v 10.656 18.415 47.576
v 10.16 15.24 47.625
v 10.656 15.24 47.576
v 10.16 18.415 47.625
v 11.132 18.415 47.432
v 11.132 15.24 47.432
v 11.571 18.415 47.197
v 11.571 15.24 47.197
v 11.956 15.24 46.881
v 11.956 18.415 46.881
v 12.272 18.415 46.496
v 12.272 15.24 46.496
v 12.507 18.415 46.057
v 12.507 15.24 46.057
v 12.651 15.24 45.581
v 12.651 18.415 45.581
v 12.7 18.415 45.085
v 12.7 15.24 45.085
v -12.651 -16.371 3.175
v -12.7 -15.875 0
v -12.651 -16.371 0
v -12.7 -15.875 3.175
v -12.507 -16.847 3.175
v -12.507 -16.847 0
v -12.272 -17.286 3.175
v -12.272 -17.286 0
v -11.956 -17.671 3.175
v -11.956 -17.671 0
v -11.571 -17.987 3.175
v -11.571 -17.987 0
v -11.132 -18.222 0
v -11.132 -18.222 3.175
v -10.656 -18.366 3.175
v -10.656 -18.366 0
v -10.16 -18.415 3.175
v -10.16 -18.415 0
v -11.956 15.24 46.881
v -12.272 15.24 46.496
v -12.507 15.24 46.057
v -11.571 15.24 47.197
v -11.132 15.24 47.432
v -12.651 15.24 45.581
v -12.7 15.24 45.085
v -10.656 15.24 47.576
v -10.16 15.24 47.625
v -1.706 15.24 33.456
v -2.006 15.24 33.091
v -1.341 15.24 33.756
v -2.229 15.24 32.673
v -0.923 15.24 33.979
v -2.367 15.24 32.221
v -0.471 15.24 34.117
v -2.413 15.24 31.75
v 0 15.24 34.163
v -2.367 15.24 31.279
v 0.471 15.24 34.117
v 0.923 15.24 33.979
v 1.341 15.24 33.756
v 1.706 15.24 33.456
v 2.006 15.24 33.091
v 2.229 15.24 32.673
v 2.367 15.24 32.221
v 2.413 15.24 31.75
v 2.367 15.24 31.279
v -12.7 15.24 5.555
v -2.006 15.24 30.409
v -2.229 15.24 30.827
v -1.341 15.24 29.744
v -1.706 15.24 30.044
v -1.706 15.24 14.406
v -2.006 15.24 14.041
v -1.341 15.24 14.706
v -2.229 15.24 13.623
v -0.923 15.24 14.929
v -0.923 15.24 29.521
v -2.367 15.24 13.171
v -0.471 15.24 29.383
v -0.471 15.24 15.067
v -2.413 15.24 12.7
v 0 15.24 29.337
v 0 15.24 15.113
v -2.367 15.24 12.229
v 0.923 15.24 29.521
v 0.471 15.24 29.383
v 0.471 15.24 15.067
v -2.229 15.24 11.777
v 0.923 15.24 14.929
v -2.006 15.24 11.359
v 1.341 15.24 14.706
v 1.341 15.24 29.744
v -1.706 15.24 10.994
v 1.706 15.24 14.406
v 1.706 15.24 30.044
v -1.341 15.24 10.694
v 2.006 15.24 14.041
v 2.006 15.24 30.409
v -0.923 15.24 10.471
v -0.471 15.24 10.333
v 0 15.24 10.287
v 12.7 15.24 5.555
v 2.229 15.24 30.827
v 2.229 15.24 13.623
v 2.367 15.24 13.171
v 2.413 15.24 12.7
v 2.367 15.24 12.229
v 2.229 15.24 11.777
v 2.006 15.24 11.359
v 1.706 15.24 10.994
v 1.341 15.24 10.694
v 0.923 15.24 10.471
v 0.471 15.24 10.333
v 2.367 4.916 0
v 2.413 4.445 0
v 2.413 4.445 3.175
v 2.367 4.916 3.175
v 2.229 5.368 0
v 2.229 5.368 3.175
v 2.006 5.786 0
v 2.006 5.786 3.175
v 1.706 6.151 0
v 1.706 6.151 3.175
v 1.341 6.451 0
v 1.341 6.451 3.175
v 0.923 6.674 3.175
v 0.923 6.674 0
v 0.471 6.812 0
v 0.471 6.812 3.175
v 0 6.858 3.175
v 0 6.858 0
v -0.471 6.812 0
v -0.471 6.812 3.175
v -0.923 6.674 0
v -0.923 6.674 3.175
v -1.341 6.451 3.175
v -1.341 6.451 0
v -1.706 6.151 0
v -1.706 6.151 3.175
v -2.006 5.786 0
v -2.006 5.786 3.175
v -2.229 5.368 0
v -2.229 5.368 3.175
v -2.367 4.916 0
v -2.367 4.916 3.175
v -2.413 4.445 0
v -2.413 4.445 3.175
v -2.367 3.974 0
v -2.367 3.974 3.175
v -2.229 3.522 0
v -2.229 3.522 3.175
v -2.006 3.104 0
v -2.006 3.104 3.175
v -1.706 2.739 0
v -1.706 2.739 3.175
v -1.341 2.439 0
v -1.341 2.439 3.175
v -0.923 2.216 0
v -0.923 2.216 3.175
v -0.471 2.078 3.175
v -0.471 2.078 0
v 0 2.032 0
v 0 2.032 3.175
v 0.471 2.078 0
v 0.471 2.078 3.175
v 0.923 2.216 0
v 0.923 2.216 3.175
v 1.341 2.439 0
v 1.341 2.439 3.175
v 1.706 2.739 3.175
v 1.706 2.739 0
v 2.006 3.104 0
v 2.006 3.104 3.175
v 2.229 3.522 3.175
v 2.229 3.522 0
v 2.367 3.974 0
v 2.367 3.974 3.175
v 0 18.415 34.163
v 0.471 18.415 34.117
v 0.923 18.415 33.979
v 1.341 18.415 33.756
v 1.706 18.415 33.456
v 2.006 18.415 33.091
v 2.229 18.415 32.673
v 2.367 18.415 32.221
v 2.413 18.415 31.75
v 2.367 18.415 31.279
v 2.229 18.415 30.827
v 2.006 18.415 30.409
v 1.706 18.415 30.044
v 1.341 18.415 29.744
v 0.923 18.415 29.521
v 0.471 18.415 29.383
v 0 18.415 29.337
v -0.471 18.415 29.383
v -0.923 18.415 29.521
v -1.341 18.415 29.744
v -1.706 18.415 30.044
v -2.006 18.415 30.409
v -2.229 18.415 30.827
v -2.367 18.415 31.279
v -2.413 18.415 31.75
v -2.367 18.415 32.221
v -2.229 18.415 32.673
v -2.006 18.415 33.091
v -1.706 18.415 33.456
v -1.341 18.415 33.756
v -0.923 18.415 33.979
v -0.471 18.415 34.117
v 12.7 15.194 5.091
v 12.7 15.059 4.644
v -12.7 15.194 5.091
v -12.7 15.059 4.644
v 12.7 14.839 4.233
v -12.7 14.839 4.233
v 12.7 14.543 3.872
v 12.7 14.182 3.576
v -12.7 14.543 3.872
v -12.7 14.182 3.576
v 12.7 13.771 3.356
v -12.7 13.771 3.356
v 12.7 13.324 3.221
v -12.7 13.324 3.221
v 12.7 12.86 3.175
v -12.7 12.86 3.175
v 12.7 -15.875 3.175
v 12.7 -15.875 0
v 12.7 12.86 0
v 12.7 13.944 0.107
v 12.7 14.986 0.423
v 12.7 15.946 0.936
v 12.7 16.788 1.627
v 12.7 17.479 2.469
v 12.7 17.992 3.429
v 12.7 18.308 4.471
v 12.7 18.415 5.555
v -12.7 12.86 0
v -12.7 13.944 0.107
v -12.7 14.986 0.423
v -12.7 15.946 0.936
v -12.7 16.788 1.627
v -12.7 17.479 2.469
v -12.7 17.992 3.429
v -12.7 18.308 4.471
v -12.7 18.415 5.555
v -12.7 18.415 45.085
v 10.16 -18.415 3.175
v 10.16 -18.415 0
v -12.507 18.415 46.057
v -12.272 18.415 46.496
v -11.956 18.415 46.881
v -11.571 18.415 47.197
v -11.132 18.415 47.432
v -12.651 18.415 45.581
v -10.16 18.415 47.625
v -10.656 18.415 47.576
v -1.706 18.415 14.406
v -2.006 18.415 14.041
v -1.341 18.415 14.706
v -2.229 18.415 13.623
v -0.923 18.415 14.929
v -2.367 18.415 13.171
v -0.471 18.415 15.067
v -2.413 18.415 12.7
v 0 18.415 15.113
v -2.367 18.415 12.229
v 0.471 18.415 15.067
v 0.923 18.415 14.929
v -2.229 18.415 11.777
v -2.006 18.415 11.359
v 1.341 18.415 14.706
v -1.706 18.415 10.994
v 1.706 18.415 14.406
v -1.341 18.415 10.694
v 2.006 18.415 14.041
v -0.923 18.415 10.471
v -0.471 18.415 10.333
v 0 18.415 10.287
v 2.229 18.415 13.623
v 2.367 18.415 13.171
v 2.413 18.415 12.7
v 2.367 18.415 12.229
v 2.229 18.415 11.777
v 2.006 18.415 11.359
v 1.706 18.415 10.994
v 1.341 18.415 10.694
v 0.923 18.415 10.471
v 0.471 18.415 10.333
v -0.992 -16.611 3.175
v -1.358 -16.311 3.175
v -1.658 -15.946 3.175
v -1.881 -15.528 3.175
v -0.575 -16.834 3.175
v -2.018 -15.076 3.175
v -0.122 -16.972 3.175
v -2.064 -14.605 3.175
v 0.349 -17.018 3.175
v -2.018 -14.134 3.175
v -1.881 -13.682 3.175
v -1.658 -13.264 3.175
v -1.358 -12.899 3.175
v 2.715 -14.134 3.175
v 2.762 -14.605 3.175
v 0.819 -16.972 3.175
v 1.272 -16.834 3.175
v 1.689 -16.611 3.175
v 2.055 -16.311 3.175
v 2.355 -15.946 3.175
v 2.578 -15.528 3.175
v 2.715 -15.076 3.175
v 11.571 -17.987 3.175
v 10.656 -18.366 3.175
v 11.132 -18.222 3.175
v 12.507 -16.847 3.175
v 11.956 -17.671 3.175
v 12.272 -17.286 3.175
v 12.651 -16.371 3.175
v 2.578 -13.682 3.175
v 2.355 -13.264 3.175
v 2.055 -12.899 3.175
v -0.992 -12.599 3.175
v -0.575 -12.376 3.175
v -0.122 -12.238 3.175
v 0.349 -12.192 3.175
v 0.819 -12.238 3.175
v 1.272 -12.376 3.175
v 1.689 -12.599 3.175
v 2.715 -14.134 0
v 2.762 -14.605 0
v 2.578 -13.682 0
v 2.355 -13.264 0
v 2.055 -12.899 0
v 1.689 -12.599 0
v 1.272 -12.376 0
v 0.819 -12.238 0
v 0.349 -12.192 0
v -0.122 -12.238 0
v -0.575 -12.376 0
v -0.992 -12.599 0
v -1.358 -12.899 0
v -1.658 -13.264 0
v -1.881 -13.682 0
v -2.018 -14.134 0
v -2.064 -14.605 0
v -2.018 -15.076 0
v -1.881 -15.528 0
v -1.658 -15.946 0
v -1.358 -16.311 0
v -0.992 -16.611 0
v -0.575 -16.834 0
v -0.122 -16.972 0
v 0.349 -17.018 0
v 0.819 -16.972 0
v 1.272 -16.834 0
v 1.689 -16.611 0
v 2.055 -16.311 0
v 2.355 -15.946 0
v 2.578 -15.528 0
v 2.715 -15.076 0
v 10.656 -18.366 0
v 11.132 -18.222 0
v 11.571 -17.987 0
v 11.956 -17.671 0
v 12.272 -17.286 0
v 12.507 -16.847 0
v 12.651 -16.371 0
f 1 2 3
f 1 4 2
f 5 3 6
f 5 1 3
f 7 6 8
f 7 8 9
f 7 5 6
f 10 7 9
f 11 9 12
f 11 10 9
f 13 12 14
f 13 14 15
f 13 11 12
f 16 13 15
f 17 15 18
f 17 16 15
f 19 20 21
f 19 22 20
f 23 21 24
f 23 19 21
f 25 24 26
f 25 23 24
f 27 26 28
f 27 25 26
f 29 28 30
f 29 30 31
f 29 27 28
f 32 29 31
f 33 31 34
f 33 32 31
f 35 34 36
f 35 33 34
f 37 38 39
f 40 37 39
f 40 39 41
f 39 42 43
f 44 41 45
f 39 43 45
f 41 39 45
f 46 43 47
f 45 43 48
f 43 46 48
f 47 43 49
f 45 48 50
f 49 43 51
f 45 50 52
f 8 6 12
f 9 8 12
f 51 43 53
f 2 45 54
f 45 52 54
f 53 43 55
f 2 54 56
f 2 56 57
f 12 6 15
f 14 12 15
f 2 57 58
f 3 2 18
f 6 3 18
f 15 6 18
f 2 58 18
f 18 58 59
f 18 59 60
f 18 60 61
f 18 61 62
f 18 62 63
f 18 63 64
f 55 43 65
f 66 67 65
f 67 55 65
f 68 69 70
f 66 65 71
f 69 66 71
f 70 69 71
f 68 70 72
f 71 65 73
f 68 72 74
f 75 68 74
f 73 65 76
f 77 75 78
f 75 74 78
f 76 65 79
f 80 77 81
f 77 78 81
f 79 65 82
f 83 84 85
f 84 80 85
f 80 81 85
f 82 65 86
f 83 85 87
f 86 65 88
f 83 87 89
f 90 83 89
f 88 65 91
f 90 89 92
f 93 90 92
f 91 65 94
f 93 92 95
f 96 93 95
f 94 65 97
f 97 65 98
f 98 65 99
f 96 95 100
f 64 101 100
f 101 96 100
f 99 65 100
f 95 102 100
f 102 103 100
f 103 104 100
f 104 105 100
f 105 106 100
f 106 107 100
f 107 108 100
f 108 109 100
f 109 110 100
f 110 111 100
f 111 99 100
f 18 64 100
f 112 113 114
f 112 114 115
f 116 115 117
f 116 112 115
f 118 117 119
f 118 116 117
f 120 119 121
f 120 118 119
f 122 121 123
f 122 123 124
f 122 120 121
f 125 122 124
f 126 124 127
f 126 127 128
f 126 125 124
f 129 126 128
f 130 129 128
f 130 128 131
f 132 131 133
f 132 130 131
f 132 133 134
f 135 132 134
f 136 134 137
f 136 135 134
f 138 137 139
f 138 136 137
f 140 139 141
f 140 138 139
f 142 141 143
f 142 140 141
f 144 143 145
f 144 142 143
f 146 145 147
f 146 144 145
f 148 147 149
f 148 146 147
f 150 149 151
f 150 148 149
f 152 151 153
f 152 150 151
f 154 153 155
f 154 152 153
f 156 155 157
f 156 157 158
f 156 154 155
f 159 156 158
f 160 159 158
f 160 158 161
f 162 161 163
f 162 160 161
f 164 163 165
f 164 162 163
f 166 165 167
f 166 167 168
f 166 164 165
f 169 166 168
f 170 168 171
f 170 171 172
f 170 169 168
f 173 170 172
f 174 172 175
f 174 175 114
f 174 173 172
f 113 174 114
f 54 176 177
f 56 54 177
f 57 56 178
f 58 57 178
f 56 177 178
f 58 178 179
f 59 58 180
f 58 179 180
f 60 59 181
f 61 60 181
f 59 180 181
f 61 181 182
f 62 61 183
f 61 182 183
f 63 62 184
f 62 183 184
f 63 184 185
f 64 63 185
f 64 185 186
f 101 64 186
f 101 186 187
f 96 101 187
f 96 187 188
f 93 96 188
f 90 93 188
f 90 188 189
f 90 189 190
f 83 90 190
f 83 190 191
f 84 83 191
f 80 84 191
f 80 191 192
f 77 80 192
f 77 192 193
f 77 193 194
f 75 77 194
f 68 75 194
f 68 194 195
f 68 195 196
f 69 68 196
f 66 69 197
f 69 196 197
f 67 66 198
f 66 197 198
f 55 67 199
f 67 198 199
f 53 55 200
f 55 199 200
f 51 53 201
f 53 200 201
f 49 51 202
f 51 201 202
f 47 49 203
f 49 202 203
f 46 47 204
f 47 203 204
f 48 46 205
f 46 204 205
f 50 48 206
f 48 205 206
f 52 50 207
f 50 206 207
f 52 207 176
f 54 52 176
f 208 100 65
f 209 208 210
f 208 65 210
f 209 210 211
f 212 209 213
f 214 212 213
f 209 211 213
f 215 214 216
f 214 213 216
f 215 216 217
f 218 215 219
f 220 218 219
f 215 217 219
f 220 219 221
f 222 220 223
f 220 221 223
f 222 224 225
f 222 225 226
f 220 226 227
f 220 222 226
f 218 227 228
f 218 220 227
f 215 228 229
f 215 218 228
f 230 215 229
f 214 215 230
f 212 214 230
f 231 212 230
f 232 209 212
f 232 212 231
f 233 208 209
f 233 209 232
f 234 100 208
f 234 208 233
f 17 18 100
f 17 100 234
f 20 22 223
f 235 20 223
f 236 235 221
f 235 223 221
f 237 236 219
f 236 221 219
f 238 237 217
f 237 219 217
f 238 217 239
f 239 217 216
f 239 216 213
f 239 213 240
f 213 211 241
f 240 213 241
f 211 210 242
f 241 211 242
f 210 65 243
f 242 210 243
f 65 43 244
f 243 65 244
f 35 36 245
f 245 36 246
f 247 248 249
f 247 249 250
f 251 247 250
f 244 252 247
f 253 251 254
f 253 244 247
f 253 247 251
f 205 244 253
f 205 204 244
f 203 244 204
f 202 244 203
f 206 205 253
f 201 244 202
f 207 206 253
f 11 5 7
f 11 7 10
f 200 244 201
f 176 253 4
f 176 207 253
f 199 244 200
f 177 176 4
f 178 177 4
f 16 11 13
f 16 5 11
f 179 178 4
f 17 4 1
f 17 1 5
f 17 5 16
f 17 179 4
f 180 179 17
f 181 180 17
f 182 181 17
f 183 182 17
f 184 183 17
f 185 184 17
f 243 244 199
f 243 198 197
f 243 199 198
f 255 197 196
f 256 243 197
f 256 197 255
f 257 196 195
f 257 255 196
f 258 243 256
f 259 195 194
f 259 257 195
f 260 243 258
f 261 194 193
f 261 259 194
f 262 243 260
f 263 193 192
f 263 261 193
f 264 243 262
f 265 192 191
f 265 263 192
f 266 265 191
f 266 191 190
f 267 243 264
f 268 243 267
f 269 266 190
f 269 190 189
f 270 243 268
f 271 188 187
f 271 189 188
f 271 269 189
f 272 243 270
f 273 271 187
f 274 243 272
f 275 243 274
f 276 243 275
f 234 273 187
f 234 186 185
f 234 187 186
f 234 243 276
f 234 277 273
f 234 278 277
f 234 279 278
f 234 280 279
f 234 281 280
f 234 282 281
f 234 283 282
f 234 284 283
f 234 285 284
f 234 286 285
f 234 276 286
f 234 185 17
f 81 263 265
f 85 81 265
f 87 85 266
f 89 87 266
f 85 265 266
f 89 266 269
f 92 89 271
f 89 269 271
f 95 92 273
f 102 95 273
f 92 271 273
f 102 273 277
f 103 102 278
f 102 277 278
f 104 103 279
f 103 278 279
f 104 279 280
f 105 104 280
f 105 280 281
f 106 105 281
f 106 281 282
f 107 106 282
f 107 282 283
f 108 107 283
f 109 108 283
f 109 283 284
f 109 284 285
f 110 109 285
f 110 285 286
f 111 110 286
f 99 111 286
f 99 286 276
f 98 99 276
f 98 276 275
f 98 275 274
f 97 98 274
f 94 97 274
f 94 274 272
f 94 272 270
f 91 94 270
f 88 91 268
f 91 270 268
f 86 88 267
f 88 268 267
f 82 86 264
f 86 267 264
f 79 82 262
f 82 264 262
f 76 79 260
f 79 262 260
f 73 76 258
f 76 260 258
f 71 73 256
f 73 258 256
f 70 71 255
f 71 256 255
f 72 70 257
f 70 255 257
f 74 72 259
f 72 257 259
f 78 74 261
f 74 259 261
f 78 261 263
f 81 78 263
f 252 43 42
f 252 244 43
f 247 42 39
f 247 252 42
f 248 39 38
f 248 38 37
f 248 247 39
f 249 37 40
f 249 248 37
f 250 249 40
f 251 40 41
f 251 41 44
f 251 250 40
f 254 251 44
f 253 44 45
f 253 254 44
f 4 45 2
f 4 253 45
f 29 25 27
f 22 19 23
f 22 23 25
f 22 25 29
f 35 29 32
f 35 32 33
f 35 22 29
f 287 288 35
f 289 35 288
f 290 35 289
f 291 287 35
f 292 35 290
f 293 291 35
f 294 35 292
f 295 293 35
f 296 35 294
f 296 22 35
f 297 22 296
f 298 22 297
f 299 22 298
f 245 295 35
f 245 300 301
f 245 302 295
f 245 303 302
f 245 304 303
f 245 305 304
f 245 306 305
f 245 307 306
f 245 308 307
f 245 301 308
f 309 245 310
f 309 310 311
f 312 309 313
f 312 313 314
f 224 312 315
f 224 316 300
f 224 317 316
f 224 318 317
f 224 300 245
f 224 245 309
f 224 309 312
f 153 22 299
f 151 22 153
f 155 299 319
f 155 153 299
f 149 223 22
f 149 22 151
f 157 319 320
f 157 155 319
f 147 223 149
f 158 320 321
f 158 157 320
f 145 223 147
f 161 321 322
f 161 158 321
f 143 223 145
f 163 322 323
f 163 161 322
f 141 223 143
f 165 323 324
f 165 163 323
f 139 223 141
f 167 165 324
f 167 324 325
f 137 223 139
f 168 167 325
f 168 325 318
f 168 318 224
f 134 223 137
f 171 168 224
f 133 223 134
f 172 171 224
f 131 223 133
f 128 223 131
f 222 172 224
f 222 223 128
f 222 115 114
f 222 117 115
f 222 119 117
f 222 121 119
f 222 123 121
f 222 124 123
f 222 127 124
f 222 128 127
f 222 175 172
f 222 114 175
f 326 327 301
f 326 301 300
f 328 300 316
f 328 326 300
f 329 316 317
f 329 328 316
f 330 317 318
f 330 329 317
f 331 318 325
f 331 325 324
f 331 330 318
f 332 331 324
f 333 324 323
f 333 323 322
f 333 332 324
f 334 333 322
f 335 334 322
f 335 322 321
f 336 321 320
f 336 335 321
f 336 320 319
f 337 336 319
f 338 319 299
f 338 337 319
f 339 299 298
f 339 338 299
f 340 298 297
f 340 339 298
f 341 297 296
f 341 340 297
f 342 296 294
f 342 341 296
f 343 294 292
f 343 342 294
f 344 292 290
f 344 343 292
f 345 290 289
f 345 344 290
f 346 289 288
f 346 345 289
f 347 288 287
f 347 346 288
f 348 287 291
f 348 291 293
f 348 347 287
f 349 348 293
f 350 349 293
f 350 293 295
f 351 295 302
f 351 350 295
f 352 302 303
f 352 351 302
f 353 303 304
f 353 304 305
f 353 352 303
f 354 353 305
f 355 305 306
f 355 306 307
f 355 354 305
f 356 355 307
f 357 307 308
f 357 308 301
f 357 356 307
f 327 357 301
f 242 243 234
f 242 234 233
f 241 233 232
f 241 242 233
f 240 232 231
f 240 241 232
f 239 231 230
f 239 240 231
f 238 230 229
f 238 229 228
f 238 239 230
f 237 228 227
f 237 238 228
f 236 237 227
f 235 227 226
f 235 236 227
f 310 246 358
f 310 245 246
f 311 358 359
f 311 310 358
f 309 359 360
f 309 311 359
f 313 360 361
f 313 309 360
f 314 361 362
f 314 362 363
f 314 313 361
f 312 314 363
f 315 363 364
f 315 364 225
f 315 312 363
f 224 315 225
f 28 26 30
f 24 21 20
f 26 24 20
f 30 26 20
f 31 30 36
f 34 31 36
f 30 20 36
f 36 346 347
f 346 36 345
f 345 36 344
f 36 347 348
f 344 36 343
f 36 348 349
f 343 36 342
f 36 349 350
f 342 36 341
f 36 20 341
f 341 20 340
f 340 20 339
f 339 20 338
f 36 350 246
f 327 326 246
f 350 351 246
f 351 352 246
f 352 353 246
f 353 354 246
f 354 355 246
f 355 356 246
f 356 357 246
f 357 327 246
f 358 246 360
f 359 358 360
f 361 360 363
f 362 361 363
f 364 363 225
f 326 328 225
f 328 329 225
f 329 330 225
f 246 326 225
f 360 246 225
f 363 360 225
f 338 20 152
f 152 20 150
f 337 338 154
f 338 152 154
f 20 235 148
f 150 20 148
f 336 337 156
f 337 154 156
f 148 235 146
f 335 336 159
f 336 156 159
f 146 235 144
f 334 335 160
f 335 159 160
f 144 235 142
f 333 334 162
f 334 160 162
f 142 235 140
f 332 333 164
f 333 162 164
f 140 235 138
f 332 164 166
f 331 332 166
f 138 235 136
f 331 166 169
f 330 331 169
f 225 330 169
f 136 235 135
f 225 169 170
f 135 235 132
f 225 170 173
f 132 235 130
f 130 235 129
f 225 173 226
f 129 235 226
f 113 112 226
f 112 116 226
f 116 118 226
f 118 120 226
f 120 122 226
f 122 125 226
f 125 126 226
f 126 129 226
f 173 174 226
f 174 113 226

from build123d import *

# Parameters (mm, degrees)
SKETCH1_W              = 25.4
SKETCH1_H              = 36.83
SKETCH1_R              = 2.413
BOSS_EXTRUDE1_DEPTH    = 3.175
SKETCH2_W              = 25.4
SKETCH2_H              = 3.175
BOSS_EXTRUDE2_DEPTH    = 44.45
SKETCH3_R              = 2.413
CUT_EXTRUDE1_DEPTH     = 44.45
FILLET1_R              = 2.54
CONVERT_SOLID1_START   = -12.7
CONVERT_SOLID1_DEPTH   = 25.4
CONVERT_SOLID1_2_DEPTH = 25.4


# Read off the part's stored shape, not the designer's step: Convert-Solid1
with BuildPart() as part:
    # Sketch1 → Boss-Extrude1 (new body)
    with BuildSketch(Plane.XY):
        Rectangle(SKETCH1_W, SKETCH1_H)
        with Locations((0, 4.445)):
            Circle(SKETCH1_R, mode=Mode.SUBTRACT)
        with Locations((0.348627451, -14.605)):
            Circle(SKETCH1_R, mode=Mode.SUBTRACT)
    extrude(amount=BOSS_EXTRUDE1_DEPTH)

    # Sketch2 → Boss-Extrude2 (add)
    with BuildSketch(Plane.XY.offset(3.175)):
        with Locations((0, 16.8275)):
            Rectangle(SKETCH2_W, SKETCH2_H)
    extrude(amount=BOSS_EXTRUDE2_DEPTH)

    # Sketch3 → Cut-Extrude1 (cut)
    with BuildSketch(Plane(origin=(0, 18.415, 0), x_dir=(1, 0, 0), z_dir=(0, 1, 0))):
        with Locations(Location((0, -12.7, 0), (0, 0, 270))):
            Circle(SKETCH3_R)
        with Locations(Location((0, -31.75, 0), (0, 0, 270))):
            Circle(SKETCH3_R)
    extrude(amount=-CUT_EXTRUDE1_DEPTH, mode=Mode.SUBTRACT)

    # Fillet1
    fillet1_edges = [part.edges().sort_by_distance(p)[0] for p in [
        (-12.7, 16.8275, 47.625),
        (12.7, 16.8275, 47.625),
        (12.7, -18.415, 1.5875),
        (-12.7, -18.415, 1.5875),
    ]]
    fillet(fillet1_edges, radius=FILLET1_R)

    # Convert-Solid1 outline → Convert-Solid1 (cut)
    with BuildSketch(Plane.YZ.offset(CONVERT_SOLID1_START)):
        with BuildLine():
            Line((18.415, 0), (18.415, 5.555000066))
            ThreePointArc((18.415, 5.555000066), (16.78797815, 1.62702185), (12.859999934, 0))
            Line((12.859999934, 0), (18.415, 0))
        make_face()
    extrude(amount=CONVERT_SOLID1_DEPTH, mode=Mode.SUBTRACT)

    # Convert-Solid1 2 outline → Convert-Solid1 2 (add)
    with BuildSketch(Plane.YZ.offset(CONVERT_SOLID1_START)):
        with BuildLine():
            Line((15.24, 3.175), (15.24, 5.555000066))
            ThreePointArc((15.24, 5.555000066), (14.54291412, 3.87208588), (12.859999934, 3.175))
            Line((12.859999934, 3.175), (15.24, 3.175))
        make_face()
    extrude(amount=CONVERT_SOLID1_2_DEPTH)


solid = part.part
